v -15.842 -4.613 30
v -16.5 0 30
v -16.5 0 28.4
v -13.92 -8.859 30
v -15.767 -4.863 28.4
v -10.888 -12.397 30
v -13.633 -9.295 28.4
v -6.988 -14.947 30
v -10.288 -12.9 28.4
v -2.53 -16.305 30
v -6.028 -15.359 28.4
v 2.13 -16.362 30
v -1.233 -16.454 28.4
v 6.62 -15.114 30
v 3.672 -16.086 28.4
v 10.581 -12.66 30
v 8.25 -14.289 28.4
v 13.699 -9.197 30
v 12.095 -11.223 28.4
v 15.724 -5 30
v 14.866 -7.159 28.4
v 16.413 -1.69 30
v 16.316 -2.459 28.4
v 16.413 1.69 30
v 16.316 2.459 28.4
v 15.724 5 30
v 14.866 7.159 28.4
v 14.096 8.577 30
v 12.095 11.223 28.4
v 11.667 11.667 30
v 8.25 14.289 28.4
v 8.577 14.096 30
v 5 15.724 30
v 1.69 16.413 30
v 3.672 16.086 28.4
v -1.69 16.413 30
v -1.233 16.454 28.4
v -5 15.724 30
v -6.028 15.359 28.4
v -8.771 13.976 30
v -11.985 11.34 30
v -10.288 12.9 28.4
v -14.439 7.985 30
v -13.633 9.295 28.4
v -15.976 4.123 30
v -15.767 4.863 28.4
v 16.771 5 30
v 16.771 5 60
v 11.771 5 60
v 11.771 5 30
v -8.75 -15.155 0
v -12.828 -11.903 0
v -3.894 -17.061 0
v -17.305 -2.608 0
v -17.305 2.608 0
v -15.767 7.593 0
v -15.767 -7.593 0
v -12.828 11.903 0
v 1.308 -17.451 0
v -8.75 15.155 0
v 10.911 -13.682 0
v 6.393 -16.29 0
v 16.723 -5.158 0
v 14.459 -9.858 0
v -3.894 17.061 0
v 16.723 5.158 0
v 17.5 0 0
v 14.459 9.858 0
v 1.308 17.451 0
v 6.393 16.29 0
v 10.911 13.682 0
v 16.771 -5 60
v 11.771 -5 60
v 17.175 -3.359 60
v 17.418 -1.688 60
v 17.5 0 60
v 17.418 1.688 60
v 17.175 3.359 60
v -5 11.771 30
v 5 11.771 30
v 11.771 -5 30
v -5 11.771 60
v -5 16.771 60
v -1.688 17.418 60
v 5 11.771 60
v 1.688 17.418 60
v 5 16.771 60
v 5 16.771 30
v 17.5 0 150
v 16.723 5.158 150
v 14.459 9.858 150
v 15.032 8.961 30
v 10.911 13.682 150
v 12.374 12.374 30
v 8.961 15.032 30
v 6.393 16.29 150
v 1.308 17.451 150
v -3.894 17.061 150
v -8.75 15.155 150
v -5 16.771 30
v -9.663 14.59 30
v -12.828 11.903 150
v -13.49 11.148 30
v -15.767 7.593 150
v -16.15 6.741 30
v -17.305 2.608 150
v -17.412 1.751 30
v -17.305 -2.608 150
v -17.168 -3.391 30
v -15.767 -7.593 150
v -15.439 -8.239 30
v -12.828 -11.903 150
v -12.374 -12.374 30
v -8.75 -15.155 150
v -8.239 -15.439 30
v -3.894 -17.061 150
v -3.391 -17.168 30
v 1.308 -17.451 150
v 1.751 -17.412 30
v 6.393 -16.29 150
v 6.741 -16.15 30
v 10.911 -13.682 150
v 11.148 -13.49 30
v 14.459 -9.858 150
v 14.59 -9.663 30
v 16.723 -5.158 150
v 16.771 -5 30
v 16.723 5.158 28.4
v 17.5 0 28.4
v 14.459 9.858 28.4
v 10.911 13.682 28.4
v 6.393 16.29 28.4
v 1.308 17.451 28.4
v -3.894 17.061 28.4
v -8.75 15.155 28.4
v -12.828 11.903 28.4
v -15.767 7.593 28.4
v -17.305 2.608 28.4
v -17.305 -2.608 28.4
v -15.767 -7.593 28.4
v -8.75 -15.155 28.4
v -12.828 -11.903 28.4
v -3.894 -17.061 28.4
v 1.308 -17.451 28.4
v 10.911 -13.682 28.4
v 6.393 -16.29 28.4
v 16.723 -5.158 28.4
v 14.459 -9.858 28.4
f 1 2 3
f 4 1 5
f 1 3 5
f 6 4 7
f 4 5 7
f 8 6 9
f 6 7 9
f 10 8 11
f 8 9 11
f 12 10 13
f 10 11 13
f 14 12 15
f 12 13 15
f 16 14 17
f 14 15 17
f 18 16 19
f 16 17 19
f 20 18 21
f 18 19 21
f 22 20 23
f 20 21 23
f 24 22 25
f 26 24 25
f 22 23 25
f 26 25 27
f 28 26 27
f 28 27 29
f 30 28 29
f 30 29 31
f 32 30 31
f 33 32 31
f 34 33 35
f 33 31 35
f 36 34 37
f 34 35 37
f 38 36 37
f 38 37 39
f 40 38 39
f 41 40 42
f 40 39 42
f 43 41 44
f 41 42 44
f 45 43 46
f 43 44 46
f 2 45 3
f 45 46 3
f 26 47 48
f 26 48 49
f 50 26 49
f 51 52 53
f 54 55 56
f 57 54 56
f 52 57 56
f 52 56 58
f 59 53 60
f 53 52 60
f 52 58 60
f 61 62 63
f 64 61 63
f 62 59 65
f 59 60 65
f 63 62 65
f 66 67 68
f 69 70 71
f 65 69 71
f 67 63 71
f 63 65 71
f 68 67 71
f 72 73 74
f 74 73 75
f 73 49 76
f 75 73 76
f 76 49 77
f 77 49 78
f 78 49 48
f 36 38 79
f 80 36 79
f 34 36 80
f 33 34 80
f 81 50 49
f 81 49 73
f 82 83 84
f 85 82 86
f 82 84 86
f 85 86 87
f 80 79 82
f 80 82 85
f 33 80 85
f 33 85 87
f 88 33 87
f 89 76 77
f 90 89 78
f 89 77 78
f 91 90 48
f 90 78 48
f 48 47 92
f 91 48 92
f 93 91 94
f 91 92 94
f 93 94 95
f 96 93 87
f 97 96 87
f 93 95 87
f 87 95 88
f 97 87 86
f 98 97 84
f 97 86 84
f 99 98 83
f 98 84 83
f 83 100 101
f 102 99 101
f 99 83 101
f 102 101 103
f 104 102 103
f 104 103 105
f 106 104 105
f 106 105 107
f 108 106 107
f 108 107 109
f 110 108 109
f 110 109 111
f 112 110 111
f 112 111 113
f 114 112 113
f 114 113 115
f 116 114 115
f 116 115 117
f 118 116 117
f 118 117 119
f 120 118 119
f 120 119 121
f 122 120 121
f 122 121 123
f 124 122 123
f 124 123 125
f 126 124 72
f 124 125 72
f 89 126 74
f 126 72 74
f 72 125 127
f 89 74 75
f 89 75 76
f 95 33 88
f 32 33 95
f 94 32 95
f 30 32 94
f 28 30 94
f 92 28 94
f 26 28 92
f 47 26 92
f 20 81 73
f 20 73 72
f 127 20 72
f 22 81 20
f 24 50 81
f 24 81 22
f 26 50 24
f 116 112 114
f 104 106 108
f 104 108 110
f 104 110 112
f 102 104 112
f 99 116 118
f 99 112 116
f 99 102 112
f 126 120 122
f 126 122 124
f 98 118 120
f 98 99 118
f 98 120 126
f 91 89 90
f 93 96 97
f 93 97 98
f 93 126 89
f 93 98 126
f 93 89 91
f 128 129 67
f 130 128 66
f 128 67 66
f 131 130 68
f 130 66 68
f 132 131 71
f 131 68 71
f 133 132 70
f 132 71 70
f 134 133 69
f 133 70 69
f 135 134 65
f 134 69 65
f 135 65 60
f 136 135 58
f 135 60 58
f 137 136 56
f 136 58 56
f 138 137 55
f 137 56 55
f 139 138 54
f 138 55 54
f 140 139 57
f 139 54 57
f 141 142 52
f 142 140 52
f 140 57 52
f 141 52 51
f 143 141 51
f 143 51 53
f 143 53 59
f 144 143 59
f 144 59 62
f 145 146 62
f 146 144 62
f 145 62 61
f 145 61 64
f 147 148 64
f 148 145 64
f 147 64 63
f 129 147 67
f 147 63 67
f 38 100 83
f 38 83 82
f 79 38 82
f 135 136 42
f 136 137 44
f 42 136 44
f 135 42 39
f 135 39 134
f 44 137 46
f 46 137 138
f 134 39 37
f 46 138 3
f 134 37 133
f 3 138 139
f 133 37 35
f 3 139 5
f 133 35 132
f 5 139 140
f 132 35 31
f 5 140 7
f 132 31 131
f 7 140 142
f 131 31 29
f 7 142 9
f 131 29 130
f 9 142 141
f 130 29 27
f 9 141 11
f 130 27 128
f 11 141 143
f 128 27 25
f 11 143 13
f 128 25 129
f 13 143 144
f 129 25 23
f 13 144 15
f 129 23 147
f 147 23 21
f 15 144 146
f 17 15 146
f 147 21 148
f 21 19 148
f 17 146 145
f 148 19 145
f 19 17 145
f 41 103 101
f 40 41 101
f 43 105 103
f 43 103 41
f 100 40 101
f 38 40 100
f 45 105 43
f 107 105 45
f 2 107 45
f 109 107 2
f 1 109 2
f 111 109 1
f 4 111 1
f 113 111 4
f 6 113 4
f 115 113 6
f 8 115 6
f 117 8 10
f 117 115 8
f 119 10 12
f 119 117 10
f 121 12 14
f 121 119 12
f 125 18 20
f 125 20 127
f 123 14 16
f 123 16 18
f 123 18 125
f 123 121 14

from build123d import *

# Parameters (mm, degrees)
SKETCH1_R           = 17.5
BOSS_EXTRUDE1_DEPTH = 150
CUT_EXTRUDE1_START  = 30
CUT_EXTRUDE1_DEPTH  = 30
SKETCH4_W           = 1.6
SKETCH4_H           = 1


with BuildPart() as part:
    # Sketch1 → Boss-Extrude1 (new body)
    with BuildSketch(Plane.XY):
        Circle(SKETCH1_R)
    extrude(amount=BOSS_EXTRUDE1_DEPTH)

    # Sketch3 → Cut-Extrude1 (cut)
    with BuildSketch(Plane.XY.offset(CUT_EXTRUDE1_START)):
        with BuildLine():
            Line((-5, 16.770509831), (-5, 11.770509831))
            Line((-5, 11.770509831), (5, 11.770509831))
            Line((5, 11.770509831), (5, 16.770509831))
            ThreePointArc((5, 16.770509831), (0, 17.5), (-5, 16.770509831))
        make_face()
        with BuildLine():
            Line((16.770509831, 5), (11.770509831, 5))
            Line((11.770509831, 5), (11.770509831, -5))
            Line((11.770509831, -5), (16.770509831, -5))
            ThreePointArc((16.770509831, -5), (17.5, 0), (16.770509831, 5))
        make_face()
    extrude(amount=CUT_EXTRUDE1_DEPTH, mode=Mode.SUBTRACT)

    # Sketch4 → Cut-Revolve1 (revolve, cut)
    with BuildSketch(Plane(origin=(0, 0, 0), x_dir=(0, 0, -1), z_dir=(1, 0, 0)), mode=Mode.PRIVATE) as cut_revolve1_sk:
        with Locations((-29.2, 17)):
            Rectangle(SKETCH4_W, SKETCH4_H)
    revolve(cut_revolve1_sk.sketch.rotate(Axis((0, 0, 0), (0, 0, 1)), 90), axis=Axis((0, 0, 0), (0, 0, 1)), mode=Mode.SUBTRACT)


solid = part.part
